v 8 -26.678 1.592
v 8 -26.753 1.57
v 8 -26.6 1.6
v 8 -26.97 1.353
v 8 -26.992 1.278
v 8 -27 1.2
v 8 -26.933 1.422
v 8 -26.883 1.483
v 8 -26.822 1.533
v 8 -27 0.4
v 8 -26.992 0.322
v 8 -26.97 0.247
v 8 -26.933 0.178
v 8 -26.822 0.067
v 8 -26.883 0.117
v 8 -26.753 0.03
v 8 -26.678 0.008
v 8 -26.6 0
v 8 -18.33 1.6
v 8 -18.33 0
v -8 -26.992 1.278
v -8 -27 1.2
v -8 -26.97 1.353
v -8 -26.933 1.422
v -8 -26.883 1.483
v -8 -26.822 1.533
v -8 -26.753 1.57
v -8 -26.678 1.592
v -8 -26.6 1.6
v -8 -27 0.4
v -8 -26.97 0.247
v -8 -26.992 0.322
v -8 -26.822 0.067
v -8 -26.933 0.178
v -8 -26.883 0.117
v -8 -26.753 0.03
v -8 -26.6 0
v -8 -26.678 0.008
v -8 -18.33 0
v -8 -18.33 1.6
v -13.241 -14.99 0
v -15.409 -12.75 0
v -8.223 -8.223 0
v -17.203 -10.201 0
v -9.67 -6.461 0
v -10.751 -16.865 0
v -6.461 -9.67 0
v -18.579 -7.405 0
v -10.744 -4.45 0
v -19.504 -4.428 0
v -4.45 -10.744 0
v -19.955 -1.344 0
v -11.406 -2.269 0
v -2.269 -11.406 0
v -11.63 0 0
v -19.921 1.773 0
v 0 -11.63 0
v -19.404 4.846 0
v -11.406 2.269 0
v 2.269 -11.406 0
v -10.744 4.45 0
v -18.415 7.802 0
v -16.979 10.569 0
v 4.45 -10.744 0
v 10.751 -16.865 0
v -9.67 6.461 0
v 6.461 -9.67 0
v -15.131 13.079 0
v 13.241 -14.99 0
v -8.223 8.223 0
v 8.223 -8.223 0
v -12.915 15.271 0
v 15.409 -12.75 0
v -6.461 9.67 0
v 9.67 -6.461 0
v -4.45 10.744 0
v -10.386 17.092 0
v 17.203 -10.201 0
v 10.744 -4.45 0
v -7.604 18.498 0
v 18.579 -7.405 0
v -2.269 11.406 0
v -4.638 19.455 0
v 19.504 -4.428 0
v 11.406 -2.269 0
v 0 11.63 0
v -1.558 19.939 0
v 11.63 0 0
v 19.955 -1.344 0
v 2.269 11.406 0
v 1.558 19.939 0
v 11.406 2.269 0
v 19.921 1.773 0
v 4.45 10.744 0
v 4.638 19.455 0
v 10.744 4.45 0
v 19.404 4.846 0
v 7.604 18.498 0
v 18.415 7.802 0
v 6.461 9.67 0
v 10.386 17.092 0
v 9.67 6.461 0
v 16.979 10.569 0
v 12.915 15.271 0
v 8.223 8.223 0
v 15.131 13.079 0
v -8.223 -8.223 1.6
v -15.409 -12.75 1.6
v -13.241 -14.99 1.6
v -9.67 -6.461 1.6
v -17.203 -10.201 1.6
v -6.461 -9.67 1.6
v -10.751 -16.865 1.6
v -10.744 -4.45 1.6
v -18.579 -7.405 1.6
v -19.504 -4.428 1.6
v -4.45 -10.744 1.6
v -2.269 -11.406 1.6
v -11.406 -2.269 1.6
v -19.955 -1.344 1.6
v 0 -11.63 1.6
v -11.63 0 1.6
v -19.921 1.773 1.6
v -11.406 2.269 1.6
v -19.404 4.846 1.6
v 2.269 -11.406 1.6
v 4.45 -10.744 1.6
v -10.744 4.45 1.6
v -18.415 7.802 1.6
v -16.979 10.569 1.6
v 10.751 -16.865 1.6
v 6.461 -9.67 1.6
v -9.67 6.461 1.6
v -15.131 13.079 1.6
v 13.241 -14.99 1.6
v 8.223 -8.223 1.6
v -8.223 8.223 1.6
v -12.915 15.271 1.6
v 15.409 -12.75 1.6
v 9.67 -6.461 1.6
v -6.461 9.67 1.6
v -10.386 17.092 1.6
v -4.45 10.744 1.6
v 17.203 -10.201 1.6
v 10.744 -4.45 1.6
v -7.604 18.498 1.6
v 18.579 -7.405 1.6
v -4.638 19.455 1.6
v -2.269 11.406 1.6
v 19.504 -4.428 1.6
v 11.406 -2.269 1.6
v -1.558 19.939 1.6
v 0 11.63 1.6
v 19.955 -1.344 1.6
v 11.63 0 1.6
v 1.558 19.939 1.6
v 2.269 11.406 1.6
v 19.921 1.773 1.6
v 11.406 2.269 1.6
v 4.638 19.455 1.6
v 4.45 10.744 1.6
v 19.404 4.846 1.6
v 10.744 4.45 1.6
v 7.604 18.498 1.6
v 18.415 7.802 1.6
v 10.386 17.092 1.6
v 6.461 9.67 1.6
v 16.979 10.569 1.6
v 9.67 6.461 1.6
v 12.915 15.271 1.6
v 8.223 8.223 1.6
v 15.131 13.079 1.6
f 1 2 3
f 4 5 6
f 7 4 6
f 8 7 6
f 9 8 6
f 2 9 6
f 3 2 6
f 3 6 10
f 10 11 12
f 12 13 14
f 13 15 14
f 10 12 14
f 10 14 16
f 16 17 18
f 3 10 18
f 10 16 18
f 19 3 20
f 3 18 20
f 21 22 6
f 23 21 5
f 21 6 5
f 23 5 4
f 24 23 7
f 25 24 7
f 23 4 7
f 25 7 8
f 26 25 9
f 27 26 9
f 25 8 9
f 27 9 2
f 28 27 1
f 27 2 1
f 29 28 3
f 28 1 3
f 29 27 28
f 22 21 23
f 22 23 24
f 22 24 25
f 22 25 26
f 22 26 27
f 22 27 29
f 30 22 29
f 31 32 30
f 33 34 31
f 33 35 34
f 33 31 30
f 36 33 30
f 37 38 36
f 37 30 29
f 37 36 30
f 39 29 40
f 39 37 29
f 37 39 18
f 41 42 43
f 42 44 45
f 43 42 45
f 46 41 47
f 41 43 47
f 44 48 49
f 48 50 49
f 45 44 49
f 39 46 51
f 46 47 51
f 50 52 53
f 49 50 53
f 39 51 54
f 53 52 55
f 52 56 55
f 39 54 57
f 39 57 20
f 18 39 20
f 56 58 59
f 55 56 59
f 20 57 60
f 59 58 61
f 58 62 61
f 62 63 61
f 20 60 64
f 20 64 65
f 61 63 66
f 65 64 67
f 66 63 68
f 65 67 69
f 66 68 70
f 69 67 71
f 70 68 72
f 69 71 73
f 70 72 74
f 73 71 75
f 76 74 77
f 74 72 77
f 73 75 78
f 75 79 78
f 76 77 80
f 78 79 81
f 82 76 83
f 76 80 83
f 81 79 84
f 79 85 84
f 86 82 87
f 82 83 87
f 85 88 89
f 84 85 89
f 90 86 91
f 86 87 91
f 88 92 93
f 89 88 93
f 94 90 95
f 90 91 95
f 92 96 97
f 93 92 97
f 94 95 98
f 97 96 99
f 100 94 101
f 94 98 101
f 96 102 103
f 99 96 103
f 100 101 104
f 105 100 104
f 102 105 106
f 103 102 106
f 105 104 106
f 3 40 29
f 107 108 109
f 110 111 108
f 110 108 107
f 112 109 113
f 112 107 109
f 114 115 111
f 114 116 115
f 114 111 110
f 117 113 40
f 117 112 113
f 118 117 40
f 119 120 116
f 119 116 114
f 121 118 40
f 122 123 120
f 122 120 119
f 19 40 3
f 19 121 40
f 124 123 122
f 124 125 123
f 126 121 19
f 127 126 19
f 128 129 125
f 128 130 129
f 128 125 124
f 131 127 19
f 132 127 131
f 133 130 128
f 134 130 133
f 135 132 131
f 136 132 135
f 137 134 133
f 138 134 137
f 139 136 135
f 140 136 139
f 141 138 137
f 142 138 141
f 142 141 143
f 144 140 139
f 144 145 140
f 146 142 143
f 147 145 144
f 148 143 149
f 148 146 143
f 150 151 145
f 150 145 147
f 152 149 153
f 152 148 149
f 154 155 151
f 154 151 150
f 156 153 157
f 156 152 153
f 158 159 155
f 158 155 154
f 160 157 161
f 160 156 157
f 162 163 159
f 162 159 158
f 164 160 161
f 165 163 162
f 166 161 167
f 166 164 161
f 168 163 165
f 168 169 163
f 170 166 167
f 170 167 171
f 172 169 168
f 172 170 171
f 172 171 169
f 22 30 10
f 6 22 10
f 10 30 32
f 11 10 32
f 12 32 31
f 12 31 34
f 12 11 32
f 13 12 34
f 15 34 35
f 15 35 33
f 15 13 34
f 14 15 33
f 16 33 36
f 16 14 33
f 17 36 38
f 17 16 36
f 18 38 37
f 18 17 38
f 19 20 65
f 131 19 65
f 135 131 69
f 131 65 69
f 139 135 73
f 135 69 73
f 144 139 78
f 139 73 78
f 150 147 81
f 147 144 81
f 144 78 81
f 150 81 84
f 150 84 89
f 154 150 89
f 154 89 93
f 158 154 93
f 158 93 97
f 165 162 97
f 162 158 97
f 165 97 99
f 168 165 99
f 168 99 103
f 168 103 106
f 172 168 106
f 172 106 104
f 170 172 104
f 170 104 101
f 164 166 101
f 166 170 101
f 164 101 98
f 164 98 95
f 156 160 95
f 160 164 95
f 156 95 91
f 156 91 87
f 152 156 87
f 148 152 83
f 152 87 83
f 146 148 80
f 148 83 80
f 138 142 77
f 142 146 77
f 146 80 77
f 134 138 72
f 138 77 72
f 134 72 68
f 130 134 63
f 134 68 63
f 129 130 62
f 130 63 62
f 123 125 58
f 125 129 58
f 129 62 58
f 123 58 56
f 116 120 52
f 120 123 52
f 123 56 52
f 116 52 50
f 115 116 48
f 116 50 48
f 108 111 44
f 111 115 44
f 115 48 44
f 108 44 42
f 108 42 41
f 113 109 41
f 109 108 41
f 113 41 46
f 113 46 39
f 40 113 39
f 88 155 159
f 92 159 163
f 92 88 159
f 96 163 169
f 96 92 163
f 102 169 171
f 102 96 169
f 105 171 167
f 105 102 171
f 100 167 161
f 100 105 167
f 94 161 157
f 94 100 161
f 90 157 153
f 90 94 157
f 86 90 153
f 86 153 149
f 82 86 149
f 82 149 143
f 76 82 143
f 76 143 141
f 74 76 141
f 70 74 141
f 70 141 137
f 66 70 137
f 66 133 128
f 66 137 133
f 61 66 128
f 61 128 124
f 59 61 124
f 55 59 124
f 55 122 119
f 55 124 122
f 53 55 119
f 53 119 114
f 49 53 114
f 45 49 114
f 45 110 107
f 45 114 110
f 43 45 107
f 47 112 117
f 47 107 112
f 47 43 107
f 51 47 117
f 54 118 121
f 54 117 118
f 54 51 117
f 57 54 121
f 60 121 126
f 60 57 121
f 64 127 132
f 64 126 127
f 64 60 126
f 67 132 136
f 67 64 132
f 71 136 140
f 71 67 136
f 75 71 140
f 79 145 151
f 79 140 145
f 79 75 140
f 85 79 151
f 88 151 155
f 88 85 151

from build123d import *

# Parameters (mm, degrees)
SKETCH_R        = 20
PAD_DEPTH       = 1.6
SKETCH001_W     = 16
SKETCH001_H     = 27
PAD001_DEPTH    = 1.6
FILLET_R        = 0.4
SKETCH002_R     = 11.629701
POCKET_DEPTH    = 0.001
POCKET001_DEPTH = 1.601


with BuildPart() as part:
    # Sketch → Pad (new body)
    with BuildSketch(Plane.XY):
        Circle(SKETCH_R)
    extrude(amount=PAD_DEPTH)

    # Sketch001 → Pad001 (join)
    with BuildSketch(Plane.XY):
        with Locations((0, -13.5)):
            Rectangle(SKETCH001_W, SKETCH001_H)
    extrude(amount=PAD001_DEPTH)

    # Fillet
    fillet_edges = [part.edges().sort_by_distance(p)[0] for p in [
        (0, -27, 1.6),
        (0, -27, 0),
    ]]
    fillet(fillet_edges, radius=FILLET_R)

    # Sketch002 → Pocket (cut, through all)
    with BuildSketch(Plane.XY):
        Circle(SKETCH002_R)
    extrude(amount=-POCKET_DEPTH, mode=Mode.SUBTRACT)

    # Sketch002 → Pocket001 (cut, through all)
    with BuildSketch(Plane.XY):
        Circle(SKETCH002_R)
    extrude(amount=POCKET001_DEPTH, mode=Mode.SUBTRACT)


solid = part.part
